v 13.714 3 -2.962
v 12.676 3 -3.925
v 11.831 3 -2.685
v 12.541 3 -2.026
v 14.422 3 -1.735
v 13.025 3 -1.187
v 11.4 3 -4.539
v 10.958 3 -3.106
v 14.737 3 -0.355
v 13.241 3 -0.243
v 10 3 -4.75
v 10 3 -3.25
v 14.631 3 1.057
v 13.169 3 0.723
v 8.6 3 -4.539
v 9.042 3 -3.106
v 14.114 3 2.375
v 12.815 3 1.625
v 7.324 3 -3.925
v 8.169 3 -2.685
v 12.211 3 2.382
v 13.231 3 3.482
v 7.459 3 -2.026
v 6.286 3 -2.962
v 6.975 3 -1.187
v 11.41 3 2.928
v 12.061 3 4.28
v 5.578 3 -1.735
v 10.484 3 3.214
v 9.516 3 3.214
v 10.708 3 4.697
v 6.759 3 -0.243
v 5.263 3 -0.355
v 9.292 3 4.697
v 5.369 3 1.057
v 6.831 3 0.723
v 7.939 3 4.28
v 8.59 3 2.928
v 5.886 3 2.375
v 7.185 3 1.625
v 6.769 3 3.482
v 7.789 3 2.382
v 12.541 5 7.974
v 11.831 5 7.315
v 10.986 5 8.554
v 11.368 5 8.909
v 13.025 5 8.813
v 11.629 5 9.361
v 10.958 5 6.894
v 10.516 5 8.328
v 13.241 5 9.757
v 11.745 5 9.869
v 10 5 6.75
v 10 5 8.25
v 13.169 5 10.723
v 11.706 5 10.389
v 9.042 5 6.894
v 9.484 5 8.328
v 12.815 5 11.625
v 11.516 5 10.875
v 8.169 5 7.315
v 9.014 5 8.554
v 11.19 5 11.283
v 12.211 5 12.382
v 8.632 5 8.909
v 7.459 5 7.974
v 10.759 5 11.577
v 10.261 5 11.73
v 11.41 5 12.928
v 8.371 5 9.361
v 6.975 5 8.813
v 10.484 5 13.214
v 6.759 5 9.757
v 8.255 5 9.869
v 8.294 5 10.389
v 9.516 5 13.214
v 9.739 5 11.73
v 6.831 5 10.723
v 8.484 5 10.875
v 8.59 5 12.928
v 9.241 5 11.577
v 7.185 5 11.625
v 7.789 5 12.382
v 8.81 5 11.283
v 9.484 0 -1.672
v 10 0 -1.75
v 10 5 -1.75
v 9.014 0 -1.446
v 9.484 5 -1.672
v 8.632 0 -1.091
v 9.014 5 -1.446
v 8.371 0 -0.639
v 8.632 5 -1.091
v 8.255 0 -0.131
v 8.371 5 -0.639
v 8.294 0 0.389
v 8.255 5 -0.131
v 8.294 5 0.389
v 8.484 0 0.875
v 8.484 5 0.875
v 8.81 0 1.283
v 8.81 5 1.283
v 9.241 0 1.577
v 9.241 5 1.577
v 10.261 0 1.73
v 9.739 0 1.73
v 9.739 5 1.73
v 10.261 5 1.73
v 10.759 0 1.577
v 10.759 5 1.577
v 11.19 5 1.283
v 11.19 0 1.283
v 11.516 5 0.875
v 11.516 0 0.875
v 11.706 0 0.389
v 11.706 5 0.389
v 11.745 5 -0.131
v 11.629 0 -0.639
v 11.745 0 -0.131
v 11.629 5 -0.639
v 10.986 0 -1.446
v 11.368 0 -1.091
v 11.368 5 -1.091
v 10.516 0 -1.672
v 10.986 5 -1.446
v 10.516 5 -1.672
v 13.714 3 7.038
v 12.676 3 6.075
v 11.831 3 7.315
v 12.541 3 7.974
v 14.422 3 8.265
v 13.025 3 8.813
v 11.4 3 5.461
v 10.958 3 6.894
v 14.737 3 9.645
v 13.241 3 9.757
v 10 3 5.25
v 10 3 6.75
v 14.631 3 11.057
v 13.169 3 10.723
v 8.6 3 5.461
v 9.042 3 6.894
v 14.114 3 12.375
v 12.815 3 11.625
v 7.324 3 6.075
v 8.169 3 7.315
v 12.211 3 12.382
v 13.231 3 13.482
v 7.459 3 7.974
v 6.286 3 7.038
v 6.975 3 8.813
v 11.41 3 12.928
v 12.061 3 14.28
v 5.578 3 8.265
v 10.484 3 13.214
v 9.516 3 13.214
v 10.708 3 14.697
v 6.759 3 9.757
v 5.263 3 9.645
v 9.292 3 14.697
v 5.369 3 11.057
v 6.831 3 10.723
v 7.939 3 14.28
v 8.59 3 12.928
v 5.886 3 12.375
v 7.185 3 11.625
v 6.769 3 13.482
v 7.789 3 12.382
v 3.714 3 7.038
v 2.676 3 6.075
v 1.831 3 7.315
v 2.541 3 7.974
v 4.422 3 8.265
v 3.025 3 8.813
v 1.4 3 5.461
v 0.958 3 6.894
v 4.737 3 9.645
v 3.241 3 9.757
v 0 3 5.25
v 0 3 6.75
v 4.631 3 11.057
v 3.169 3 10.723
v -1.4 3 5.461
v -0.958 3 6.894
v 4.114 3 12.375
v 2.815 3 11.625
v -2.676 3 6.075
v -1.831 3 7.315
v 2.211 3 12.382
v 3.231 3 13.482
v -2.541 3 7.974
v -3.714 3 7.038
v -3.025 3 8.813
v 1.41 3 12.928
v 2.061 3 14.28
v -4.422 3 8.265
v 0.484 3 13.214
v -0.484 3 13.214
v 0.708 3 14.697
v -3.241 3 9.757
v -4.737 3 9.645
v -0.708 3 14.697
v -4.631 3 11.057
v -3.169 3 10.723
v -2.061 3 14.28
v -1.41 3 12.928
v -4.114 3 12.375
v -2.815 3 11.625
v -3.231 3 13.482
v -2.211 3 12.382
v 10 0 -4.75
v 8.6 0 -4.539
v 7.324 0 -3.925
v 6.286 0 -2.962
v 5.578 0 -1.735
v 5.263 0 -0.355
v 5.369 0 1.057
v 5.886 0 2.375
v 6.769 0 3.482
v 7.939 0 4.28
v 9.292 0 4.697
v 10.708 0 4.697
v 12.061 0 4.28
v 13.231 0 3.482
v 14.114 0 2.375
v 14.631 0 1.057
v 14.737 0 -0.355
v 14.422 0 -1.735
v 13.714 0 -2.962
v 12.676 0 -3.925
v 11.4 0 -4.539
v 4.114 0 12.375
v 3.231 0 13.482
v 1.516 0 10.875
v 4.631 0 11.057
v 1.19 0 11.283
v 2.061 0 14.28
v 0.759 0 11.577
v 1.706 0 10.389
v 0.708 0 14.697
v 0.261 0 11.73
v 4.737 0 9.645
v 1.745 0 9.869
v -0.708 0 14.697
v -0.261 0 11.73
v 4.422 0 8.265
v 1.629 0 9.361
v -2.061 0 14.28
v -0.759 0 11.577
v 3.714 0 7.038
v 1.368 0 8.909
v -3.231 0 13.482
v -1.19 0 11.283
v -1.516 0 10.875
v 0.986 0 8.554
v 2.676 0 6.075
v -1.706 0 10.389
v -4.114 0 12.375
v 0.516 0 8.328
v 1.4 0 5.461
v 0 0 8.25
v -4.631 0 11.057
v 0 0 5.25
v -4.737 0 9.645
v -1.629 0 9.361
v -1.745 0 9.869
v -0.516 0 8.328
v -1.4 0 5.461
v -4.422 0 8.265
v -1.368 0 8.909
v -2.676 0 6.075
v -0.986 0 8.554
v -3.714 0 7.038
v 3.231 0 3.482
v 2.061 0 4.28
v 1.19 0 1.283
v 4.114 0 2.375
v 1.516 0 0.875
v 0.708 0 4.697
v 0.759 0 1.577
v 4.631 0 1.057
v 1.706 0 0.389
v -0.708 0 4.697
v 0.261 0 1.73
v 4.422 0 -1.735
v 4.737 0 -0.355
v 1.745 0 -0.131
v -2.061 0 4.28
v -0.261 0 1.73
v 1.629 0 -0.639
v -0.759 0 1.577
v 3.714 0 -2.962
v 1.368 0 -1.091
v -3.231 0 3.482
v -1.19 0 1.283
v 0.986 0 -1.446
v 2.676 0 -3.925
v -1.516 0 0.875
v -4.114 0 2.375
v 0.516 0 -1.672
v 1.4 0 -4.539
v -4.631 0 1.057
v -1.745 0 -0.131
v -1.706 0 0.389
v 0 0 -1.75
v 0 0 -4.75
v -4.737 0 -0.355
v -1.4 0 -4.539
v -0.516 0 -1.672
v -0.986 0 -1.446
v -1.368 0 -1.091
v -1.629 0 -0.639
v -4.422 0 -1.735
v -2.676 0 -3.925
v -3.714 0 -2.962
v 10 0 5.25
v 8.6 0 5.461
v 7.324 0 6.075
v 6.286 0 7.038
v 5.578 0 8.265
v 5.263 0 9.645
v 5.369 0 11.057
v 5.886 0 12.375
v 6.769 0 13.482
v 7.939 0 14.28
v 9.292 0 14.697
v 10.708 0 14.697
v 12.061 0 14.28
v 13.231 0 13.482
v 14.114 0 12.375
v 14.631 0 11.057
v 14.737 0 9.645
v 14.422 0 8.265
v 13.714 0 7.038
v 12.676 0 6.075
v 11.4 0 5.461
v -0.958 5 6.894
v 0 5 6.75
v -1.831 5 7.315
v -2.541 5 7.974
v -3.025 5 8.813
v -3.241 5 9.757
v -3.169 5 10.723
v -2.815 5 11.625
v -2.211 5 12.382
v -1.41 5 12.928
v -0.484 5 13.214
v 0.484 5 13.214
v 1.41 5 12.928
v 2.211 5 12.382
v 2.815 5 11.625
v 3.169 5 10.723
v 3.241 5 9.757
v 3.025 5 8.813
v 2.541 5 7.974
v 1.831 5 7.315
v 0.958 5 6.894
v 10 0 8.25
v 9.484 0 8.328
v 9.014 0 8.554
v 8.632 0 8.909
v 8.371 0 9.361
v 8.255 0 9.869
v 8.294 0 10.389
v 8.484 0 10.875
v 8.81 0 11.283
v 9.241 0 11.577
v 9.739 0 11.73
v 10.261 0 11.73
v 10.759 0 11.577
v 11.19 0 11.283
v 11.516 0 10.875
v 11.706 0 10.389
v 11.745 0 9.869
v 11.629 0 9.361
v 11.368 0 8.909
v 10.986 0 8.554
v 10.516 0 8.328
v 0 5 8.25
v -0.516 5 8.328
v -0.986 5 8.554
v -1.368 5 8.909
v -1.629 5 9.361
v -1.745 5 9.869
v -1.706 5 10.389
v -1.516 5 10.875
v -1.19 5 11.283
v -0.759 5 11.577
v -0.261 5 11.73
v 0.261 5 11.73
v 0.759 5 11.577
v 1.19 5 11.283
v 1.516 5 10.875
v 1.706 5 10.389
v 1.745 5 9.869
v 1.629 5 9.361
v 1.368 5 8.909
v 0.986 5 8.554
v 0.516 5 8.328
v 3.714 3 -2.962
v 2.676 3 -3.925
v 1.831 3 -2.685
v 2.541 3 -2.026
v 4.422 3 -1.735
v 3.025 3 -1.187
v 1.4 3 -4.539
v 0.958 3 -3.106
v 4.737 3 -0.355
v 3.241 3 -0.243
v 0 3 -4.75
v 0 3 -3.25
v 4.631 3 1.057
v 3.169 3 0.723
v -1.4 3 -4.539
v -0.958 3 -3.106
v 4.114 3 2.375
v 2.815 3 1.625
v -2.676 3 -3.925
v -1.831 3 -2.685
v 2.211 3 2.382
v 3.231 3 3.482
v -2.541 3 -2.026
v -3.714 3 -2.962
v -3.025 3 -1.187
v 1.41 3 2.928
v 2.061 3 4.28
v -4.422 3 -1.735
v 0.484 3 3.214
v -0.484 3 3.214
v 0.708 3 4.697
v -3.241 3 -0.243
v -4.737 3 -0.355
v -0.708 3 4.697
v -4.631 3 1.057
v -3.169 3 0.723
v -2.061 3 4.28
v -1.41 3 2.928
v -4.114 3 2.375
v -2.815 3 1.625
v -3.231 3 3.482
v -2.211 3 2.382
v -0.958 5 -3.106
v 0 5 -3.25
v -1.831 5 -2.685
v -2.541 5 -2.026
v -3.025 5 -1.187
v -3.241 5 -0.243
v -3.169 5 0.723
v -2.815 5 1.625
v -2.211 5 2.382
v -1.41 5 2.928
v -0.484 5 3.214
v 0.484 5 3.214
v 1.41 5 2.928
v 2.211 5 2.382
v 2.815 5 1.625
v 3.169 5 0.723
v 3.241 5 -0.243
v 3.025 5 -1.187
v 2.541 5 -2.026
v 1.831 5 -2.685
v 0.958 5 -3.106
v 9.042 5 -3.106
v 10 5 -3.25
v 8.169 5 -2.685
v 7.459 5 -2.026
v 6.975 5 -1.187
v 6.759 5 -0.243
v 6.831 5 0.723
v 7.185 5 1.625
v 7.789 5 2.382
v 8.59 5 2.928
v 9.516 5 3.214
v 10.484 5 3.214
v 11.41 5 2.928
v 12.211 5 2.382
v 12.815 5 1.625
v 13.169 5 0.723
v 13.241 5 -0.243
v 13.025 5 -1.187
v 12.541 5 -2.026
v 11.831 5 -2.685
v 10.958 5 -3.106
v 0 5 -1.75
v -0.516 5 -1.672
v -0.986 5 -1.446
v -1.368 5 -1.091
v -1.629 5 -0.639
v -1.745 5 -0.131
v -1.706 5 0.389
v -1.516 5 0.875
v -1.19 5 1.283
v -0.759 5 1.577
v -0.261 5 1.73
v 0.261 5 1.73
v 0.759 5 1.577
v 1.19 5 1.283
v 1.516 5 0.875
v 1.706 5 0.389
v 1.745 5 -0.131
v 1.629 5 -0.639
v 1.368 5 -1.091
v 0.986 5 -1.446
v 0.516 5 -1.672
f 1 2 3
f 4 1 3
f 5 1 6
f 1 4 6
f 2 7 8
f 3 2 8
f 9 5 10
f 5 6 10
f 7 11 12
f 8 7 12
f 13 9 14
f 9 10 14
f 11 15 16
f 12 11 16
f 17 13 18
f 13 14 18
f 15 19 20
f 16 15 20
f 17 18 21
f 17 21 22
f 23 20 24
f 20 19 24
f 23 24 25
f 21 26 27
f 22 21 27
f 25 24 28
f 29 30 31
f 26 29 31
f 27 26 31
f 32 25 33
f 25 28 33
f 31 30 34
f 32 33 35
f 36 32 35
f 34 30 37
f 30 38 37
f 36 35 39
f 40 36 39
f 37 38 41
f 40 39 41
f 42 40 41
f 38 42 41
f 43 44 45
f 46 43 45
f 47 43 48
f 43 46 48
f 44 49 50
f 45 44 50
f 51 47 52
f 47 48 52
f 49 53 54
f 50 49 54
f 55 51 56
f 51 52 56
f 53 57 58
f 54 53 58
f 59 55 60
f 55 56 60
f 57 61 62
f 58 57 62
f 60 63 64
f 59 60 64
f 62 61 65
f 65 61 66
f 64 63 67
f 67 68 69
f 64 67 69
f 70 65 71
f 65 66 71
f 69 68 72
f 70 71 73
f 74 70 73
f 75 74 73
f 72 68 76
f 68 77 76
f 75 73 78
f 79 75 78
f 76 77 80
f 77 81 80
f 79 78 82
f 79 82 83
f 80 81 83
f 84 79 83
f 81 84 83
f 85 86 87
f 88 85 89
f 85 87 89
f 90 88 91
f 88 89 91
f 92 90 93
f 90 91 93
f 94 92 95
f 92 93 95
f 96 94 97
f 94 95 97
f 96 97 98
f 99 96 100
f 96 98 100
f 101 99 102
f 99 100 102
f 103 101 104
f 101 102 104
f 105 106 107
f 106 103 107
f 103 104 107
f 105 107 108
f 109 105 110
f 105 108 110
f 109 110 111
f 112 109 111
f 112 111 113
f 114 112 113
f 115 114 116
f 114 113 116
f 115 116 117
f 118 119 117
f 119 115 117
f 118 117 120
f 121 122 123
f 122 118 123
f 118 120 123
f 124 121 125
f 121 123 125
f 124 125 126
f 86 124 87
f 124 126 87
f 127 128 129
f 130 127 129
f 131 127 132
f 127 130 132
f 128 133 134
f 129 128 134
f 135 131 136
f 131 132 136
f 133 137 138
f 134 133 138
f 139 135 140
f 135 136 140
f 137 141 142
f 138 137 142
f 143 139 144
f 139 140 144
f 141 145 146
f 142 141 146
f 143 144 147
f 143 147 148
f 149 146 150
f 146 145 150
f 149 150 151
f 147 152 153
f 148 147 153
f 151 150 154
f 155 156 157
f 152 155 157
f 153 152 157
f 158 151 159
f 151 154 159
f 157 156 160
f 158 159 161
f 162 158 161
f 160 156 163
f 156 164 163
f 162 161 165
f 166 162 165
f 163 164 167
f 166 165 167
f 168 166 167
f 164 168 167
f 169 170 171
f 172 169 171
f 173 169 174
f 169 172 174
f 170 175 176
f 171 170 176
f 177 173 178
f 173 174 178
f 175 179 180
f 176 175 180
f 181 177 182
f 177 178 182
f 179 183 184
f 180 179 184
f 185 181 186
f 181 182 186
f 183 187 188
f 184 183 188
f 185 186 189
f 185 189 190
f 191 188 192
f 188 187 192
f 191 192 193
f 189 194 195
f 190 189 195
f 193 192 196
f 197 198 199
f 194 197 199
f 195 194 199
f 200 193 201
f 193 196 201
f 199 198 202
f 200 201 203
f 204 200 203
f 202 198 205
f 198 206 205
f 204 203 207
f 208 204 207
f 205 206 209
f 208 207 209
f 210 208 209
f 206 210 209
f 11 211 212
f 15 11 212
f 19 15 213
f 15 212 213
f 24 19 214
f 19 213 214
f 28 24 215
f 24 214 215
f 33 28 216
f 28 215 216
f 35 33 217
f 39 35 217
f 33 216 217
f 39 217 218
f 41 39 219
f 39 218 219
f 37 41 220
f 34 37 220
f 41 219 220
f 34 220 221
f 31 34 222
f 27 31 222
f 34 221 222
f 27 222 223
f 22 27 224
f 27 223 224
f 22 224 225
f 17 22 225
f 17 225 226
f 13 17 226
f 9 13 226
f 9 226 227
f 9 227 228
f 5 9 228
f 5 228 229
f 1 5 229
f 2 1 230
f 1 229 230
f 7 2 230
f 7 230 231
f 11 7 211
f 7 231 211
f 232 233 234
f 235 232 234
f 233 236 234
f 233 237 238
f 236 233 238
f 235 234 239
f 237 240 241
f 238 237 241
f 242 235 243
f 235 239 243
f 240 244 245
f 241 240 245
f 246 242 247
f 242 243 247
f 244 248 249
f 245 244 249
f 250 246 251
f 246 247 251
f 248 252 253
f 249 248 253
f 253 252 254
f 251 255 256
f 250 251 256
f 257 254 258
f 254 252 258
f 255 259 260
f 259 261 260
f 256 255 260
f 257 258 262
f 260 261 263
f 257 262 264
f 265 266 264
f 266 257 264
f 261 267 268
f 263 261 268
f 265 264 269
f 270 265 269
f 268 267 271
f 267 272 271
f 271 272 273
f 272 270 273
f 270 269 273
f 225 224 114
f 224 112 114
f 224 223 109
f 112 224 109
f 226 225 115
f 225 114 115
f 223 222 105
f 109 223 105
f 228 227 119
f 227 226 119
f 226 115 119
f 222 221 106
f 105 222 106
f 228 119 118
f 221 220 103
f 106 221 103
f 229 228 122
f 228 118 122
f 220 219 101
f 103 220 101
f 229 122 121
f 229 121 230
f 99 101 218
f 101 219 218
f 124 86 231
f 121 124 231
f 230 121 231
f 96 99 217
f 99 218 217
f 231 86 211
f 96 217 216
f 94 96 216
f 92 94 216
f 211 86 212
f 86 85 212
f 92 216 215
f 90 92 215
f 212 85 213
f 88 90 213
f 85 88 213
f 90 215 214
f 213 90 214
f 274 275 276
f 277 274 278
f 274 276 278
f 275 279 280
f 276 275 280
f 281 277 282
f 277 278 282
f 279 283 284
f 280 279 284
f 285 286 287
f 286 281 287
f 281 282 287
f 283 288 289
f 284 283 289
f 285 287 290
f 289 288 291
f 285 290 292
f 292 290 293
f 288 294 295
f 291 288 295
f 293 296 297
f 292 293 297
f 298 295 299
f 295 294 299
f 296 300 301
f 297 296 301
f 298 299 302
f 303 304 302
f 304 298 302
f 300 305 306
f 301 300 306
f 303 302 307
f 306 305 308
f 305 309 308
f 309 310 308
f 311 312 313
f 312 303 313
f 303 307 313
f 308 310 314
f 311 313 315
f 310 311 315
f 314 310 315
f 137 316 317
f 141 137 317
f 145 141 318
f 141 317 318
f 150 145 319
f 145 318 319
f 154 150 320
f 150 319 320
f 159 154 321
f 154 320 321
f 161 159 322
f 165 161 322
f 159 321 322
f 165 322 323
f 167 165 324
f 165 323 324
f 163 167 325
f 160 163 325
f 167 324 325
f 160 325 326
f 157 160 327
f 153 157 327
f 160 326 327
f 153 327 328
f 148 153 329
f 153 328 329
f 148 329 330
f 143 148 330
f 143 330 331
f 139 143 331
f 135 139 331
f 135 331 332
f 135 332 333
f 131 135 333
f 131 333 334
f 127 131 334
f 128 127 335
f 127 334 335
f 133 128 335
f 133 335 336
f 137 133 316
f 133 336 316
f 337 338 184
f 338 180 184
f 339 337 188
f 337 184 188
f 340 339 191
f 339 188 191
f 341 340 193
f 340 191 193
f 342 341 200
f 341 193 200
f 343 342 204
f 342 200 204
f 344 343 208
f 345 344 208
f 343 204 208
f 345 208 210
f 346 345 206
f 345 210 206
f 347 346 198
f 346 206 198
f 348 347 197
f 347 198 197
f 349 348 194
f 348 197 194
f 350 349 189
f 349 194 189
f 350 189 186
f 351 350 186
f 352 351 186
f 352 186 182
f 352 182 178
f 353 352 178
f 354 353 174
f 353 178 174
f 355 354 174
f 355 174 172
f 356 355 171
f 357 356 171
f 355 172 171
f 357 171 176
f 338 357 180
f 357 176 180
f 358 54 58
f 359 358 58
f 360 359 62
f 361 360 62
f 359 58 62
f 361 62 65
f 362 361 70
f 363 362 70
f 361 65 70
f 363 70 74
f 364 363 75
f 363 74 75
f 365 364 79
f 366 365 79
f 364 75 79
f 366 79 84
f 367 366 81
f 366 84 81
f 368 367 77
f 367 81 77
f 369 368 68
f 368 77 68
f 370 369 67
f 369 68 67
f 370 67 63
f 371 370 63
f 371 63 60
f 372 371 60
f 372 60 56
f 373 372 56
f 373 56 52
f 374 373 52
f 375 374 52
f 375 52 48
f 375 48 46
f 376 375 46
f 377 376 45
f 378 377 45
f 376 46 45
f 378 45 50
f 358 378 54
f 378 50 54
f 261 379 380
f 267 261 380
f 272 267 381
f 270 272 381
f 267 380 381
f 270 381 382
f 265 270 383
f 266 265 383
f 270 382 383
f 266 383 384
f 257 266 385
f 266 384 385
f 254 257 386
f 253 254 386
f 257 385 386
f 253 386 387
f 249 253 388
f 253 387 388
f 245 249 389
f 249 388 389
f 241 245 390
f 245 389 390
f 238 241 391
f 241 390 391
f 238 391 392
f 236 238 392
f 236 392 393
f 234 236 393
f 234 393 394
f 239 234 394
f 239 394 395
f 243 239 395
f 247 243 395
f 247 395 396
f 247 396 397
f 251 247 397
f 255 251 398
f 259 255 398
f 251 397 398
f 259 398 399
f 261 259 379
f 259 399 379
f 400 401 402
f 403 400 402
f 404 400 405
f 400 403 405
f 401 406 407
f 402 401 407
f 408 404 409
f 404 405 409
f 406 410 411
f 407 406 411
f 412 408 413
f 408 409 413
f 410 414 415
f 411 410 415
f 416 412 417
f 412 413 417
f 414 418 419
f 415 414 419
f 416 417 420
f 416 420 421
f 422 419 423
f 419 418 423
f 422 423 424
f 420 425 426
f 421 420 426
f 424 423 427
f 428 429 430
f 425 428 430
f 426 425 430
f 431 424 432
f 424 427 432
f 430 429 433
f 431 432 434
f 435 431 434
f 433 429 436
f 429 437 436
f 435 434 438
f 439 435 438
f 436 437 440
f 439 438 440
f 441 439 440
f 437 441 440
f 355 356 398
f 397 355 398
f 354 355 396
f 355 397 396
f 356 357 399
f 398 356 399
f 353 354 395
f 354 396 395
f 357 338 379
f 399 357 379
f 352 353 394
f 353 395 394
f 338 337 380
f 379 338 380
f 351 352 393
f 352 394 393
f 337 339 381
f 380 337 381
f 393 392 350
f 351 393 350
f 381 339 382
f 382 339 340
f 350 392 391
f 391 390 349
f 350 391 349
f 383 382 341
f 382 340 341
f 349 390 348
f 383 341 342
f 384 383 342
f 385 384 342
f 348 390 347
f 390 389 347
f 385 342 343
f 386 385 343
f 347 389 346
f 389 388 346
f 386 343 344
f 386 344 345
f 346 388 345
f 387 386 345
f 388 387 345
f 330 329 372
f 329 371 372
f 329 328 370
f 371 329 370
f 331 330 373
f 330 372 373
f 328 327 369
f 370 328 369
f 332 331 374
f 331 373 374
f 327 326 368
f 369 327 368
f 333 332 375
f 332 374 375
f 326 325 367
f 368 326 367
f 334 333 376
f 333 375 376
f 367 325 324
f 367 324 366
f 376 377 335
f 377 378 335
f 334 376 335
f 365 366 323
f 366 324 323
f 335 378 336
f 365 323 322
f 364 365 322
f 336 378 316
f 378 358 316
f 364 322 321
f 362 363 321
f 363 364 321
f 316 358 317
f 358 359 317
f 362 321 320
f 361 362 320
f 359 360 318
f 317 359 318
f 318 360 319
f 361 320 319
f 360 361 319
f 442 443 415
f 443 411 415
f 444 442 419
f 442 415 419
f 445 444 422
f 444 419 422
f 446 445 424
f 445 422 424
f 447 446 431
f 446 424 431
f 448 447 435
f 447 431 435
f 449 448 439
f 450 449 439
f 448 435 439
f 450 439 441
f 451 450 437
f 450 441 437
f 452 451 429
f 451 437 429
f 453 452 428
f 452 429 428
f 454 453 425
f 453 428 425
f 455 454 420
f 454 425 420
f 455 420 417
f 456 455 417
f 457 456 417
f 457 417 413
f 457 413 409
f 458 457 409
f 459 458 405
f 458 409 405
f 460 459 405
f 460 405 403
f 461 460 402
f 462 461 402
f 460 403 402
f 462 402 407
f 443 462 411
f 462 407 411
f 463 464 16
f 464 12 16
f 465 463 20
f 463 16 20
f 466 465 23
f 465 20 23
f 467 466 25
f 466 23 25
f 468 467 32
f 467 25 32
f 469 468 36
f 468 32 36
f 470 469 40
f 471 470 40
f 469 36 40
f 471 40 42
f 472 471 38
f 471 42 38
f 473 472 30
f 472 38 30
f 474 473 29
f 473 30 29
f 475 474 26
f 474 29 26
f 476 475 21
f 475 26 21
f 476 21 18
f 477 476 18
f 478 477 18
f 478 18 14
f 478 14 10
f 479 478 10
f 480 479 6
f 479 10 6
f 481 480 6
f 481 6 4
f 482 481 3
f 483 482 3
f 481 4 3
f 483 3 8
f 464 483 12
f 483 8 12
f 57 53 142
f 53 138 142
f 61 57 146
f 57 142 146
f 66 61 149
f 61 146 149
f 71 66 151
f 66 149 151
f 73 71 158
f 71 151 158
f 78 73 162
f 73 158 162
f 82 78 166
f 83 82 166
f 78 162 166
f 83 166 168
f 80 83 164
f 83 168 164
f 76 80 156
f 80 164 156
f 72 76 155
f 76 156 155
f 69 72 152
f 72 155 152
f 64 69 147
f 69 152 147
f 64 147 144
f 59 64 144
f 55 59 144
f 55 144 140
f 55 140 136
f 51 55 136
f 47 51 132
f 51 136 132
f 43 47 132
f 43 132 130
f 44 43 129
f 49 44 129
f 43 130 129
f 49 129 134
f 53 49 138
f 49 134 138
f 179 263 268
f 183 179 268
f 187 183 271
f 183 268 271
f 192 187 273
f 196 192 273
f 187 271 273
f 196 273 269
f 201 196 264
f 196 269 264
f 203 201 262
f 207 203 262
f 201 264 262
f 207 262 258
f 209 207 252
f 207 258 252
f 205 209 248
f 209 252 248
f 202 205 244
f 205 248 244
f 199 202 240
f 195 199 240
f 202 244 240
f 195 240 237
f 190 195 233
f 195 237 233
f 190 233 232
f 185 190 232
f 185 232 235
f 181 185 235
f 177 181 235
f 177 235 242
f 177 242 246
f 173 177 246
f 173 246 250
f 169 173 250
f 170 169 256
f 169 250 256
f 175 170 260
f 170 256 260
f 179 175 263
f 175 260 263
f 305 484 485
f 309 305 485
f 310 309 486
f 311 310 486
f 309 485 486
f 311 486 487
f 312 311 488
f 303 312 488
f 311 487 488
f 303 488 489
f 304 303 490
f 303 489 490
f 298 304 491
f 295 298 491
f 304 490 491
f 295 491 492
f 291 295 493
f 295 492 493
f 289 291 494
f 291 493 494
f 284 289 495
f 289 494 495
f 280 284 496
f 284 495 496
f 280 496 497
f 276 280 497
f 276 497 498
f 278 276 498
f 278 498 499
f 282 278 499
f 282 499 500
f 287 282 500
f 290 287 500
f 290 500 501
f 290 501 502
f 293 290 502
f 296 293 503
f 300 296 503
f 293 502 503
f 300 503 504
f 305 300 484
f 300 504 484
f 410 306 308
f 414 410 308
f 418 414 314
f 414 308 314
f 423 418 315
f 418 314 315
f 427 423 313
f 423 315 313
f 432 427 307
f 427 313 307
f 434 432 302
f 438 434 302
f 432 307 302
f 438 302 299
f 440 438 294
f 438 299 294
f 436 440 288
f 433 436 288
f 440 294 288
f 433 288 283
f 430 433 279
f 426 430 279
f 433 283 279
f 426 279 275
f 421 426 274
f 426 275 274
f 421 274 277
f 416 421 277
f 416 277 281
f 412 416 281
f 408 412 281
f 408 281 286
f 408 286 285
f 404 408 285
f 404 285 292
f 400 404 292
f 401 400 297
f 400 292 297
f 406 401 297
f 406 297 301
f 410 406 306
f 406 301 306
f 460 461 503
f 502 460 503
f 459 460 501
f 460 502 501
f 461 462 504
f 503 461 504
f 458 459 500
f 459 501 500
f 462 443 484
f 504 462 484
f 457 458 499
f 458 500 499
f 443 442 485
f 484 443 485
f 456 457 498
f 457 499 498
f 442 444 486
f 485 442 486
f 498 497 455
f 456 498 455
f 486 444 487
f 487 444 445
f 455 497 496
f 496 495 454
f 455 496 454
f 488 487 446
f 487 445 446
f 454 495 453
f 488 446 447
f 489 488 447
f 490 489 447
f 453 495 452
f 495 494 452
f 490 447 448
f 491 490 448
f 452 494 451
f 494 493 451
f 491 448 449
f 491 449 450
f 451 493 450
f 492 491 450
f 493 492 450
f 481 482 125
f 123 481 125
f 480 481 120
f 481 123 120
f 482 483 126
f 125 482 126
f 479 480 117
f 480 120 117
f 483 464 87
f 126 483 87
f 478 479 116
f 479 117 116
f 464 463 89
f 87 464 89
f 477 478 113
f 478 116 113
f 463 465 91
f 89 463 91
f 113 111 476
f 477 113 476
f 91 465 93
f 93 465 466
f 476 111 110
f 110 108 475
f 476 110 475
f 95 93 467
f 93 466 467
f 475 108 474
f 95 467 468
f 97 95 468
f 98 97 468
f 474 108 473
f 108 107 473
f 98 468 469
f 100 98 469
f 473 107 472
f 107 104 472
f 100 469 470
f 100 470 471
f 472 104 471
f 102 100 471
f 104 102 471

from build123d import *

# Parameters (mm, degrees)
SKETCH3_W            = 10
SKETCH3_H            = 10
BOSS_EXTRUDE1_DEPTH  = 10
LPATTERN2_COUNT      = 2
LPATTERN2_PITCH      = 10
LPATTERN2_COUNT_DIR2 = 2
LPATTERN2_PITCH_DIR2 = 10
SKETCH4_W            = 10
SKETCH4_H            = 10
CUT_EXTRUDE1_DEPTH   = 10


with BuildPart() as part:
    # Sketch1 → Revolve1 (revolve)
    with BuildSketch(Plane.XY, mode=Mode.PRIVATE) as revolve1_sk:
        Polygon((1.75, 0), (1.75, 5), (3.25, 5), (3.25, 3), (4.75, 3), (4.75, 0), align=None)
    revolve1 = revolve(revolve1_sk.sketch.rotate(Axis((0, 0, 0), (0, 1, 0)), 90), axis=Axis((0, 0, 0), (0, 1, 0)))

    # Sketch3 → Boss-Extrude1 (add)
    with BuildSketch(Plane.XZ):
        with Locations((5, 5)):
            Rectangle(SKETCH3_W, SKETCH3_H)
    extrude(amount=BOSS_EXTRUDE1_DEPTH)

    # LPattern2: Revolve1 2 × 2
    with Locations(*[(j * LPATTERN2_PITCH_DIR2, 0, i * LPATTERN2_PITCH) for i in range(LPATTERN2_COUNT) for j in range(LPATTERN2_COUNT_DIR2) if (i, j) != (0, 0)]):
        add(revolve1)

    # Sketch4 → Cut-Extrude1 (cut)
    with BuildSketch(Plane.XZ.offset(10)):
        with Locations((5, 5)):
            Rectangle(SKETCH4_W, SKETCH4_H)
    extrude(amount=-CUT_EXTRUDE1_DEPTH, mode=Mode.SUBTRACT)


with BuildPart() as cut_extrude1_piece_1:
    # of the separate pieces the step leaves, piece 1, a body of its own (cut_extrude1_pieces)
    add(part.part.solids().sort_by_distance((10, 3, 5.25))[0])


with BuildPart() as cut_extrude1_piece_2:
    # of the separate pieces the step leaves, piece 2, a body of its own (cut_extrude1_pieces)
    add(part.part.solids().sort_by_distance((10, 0, -4.75))[0])


with BuildPart() as cut_extrude1_piece_3:
    # of the separate pieces the step leaves, piece 3, a body of its own (cut_extrude1_pieces)
    add(part.part.solids().sort_by_distance((0, 0, 8.25))[0])


with BuildPart() as cut_extrude1_piece_4:
    # of the separate pieces the step leaves, piece 4, a body of its own (cut_extrude1_pieces)
    add(part.part.solids().sort_by_distance((0, 0, -1.75))[0])


solid = Compound([cut_extrude1_piece_1.part, cut_extrude1_piece_2.part, cut_extrude1_piece_3.part, cut_extrude1_piece_4.part])
